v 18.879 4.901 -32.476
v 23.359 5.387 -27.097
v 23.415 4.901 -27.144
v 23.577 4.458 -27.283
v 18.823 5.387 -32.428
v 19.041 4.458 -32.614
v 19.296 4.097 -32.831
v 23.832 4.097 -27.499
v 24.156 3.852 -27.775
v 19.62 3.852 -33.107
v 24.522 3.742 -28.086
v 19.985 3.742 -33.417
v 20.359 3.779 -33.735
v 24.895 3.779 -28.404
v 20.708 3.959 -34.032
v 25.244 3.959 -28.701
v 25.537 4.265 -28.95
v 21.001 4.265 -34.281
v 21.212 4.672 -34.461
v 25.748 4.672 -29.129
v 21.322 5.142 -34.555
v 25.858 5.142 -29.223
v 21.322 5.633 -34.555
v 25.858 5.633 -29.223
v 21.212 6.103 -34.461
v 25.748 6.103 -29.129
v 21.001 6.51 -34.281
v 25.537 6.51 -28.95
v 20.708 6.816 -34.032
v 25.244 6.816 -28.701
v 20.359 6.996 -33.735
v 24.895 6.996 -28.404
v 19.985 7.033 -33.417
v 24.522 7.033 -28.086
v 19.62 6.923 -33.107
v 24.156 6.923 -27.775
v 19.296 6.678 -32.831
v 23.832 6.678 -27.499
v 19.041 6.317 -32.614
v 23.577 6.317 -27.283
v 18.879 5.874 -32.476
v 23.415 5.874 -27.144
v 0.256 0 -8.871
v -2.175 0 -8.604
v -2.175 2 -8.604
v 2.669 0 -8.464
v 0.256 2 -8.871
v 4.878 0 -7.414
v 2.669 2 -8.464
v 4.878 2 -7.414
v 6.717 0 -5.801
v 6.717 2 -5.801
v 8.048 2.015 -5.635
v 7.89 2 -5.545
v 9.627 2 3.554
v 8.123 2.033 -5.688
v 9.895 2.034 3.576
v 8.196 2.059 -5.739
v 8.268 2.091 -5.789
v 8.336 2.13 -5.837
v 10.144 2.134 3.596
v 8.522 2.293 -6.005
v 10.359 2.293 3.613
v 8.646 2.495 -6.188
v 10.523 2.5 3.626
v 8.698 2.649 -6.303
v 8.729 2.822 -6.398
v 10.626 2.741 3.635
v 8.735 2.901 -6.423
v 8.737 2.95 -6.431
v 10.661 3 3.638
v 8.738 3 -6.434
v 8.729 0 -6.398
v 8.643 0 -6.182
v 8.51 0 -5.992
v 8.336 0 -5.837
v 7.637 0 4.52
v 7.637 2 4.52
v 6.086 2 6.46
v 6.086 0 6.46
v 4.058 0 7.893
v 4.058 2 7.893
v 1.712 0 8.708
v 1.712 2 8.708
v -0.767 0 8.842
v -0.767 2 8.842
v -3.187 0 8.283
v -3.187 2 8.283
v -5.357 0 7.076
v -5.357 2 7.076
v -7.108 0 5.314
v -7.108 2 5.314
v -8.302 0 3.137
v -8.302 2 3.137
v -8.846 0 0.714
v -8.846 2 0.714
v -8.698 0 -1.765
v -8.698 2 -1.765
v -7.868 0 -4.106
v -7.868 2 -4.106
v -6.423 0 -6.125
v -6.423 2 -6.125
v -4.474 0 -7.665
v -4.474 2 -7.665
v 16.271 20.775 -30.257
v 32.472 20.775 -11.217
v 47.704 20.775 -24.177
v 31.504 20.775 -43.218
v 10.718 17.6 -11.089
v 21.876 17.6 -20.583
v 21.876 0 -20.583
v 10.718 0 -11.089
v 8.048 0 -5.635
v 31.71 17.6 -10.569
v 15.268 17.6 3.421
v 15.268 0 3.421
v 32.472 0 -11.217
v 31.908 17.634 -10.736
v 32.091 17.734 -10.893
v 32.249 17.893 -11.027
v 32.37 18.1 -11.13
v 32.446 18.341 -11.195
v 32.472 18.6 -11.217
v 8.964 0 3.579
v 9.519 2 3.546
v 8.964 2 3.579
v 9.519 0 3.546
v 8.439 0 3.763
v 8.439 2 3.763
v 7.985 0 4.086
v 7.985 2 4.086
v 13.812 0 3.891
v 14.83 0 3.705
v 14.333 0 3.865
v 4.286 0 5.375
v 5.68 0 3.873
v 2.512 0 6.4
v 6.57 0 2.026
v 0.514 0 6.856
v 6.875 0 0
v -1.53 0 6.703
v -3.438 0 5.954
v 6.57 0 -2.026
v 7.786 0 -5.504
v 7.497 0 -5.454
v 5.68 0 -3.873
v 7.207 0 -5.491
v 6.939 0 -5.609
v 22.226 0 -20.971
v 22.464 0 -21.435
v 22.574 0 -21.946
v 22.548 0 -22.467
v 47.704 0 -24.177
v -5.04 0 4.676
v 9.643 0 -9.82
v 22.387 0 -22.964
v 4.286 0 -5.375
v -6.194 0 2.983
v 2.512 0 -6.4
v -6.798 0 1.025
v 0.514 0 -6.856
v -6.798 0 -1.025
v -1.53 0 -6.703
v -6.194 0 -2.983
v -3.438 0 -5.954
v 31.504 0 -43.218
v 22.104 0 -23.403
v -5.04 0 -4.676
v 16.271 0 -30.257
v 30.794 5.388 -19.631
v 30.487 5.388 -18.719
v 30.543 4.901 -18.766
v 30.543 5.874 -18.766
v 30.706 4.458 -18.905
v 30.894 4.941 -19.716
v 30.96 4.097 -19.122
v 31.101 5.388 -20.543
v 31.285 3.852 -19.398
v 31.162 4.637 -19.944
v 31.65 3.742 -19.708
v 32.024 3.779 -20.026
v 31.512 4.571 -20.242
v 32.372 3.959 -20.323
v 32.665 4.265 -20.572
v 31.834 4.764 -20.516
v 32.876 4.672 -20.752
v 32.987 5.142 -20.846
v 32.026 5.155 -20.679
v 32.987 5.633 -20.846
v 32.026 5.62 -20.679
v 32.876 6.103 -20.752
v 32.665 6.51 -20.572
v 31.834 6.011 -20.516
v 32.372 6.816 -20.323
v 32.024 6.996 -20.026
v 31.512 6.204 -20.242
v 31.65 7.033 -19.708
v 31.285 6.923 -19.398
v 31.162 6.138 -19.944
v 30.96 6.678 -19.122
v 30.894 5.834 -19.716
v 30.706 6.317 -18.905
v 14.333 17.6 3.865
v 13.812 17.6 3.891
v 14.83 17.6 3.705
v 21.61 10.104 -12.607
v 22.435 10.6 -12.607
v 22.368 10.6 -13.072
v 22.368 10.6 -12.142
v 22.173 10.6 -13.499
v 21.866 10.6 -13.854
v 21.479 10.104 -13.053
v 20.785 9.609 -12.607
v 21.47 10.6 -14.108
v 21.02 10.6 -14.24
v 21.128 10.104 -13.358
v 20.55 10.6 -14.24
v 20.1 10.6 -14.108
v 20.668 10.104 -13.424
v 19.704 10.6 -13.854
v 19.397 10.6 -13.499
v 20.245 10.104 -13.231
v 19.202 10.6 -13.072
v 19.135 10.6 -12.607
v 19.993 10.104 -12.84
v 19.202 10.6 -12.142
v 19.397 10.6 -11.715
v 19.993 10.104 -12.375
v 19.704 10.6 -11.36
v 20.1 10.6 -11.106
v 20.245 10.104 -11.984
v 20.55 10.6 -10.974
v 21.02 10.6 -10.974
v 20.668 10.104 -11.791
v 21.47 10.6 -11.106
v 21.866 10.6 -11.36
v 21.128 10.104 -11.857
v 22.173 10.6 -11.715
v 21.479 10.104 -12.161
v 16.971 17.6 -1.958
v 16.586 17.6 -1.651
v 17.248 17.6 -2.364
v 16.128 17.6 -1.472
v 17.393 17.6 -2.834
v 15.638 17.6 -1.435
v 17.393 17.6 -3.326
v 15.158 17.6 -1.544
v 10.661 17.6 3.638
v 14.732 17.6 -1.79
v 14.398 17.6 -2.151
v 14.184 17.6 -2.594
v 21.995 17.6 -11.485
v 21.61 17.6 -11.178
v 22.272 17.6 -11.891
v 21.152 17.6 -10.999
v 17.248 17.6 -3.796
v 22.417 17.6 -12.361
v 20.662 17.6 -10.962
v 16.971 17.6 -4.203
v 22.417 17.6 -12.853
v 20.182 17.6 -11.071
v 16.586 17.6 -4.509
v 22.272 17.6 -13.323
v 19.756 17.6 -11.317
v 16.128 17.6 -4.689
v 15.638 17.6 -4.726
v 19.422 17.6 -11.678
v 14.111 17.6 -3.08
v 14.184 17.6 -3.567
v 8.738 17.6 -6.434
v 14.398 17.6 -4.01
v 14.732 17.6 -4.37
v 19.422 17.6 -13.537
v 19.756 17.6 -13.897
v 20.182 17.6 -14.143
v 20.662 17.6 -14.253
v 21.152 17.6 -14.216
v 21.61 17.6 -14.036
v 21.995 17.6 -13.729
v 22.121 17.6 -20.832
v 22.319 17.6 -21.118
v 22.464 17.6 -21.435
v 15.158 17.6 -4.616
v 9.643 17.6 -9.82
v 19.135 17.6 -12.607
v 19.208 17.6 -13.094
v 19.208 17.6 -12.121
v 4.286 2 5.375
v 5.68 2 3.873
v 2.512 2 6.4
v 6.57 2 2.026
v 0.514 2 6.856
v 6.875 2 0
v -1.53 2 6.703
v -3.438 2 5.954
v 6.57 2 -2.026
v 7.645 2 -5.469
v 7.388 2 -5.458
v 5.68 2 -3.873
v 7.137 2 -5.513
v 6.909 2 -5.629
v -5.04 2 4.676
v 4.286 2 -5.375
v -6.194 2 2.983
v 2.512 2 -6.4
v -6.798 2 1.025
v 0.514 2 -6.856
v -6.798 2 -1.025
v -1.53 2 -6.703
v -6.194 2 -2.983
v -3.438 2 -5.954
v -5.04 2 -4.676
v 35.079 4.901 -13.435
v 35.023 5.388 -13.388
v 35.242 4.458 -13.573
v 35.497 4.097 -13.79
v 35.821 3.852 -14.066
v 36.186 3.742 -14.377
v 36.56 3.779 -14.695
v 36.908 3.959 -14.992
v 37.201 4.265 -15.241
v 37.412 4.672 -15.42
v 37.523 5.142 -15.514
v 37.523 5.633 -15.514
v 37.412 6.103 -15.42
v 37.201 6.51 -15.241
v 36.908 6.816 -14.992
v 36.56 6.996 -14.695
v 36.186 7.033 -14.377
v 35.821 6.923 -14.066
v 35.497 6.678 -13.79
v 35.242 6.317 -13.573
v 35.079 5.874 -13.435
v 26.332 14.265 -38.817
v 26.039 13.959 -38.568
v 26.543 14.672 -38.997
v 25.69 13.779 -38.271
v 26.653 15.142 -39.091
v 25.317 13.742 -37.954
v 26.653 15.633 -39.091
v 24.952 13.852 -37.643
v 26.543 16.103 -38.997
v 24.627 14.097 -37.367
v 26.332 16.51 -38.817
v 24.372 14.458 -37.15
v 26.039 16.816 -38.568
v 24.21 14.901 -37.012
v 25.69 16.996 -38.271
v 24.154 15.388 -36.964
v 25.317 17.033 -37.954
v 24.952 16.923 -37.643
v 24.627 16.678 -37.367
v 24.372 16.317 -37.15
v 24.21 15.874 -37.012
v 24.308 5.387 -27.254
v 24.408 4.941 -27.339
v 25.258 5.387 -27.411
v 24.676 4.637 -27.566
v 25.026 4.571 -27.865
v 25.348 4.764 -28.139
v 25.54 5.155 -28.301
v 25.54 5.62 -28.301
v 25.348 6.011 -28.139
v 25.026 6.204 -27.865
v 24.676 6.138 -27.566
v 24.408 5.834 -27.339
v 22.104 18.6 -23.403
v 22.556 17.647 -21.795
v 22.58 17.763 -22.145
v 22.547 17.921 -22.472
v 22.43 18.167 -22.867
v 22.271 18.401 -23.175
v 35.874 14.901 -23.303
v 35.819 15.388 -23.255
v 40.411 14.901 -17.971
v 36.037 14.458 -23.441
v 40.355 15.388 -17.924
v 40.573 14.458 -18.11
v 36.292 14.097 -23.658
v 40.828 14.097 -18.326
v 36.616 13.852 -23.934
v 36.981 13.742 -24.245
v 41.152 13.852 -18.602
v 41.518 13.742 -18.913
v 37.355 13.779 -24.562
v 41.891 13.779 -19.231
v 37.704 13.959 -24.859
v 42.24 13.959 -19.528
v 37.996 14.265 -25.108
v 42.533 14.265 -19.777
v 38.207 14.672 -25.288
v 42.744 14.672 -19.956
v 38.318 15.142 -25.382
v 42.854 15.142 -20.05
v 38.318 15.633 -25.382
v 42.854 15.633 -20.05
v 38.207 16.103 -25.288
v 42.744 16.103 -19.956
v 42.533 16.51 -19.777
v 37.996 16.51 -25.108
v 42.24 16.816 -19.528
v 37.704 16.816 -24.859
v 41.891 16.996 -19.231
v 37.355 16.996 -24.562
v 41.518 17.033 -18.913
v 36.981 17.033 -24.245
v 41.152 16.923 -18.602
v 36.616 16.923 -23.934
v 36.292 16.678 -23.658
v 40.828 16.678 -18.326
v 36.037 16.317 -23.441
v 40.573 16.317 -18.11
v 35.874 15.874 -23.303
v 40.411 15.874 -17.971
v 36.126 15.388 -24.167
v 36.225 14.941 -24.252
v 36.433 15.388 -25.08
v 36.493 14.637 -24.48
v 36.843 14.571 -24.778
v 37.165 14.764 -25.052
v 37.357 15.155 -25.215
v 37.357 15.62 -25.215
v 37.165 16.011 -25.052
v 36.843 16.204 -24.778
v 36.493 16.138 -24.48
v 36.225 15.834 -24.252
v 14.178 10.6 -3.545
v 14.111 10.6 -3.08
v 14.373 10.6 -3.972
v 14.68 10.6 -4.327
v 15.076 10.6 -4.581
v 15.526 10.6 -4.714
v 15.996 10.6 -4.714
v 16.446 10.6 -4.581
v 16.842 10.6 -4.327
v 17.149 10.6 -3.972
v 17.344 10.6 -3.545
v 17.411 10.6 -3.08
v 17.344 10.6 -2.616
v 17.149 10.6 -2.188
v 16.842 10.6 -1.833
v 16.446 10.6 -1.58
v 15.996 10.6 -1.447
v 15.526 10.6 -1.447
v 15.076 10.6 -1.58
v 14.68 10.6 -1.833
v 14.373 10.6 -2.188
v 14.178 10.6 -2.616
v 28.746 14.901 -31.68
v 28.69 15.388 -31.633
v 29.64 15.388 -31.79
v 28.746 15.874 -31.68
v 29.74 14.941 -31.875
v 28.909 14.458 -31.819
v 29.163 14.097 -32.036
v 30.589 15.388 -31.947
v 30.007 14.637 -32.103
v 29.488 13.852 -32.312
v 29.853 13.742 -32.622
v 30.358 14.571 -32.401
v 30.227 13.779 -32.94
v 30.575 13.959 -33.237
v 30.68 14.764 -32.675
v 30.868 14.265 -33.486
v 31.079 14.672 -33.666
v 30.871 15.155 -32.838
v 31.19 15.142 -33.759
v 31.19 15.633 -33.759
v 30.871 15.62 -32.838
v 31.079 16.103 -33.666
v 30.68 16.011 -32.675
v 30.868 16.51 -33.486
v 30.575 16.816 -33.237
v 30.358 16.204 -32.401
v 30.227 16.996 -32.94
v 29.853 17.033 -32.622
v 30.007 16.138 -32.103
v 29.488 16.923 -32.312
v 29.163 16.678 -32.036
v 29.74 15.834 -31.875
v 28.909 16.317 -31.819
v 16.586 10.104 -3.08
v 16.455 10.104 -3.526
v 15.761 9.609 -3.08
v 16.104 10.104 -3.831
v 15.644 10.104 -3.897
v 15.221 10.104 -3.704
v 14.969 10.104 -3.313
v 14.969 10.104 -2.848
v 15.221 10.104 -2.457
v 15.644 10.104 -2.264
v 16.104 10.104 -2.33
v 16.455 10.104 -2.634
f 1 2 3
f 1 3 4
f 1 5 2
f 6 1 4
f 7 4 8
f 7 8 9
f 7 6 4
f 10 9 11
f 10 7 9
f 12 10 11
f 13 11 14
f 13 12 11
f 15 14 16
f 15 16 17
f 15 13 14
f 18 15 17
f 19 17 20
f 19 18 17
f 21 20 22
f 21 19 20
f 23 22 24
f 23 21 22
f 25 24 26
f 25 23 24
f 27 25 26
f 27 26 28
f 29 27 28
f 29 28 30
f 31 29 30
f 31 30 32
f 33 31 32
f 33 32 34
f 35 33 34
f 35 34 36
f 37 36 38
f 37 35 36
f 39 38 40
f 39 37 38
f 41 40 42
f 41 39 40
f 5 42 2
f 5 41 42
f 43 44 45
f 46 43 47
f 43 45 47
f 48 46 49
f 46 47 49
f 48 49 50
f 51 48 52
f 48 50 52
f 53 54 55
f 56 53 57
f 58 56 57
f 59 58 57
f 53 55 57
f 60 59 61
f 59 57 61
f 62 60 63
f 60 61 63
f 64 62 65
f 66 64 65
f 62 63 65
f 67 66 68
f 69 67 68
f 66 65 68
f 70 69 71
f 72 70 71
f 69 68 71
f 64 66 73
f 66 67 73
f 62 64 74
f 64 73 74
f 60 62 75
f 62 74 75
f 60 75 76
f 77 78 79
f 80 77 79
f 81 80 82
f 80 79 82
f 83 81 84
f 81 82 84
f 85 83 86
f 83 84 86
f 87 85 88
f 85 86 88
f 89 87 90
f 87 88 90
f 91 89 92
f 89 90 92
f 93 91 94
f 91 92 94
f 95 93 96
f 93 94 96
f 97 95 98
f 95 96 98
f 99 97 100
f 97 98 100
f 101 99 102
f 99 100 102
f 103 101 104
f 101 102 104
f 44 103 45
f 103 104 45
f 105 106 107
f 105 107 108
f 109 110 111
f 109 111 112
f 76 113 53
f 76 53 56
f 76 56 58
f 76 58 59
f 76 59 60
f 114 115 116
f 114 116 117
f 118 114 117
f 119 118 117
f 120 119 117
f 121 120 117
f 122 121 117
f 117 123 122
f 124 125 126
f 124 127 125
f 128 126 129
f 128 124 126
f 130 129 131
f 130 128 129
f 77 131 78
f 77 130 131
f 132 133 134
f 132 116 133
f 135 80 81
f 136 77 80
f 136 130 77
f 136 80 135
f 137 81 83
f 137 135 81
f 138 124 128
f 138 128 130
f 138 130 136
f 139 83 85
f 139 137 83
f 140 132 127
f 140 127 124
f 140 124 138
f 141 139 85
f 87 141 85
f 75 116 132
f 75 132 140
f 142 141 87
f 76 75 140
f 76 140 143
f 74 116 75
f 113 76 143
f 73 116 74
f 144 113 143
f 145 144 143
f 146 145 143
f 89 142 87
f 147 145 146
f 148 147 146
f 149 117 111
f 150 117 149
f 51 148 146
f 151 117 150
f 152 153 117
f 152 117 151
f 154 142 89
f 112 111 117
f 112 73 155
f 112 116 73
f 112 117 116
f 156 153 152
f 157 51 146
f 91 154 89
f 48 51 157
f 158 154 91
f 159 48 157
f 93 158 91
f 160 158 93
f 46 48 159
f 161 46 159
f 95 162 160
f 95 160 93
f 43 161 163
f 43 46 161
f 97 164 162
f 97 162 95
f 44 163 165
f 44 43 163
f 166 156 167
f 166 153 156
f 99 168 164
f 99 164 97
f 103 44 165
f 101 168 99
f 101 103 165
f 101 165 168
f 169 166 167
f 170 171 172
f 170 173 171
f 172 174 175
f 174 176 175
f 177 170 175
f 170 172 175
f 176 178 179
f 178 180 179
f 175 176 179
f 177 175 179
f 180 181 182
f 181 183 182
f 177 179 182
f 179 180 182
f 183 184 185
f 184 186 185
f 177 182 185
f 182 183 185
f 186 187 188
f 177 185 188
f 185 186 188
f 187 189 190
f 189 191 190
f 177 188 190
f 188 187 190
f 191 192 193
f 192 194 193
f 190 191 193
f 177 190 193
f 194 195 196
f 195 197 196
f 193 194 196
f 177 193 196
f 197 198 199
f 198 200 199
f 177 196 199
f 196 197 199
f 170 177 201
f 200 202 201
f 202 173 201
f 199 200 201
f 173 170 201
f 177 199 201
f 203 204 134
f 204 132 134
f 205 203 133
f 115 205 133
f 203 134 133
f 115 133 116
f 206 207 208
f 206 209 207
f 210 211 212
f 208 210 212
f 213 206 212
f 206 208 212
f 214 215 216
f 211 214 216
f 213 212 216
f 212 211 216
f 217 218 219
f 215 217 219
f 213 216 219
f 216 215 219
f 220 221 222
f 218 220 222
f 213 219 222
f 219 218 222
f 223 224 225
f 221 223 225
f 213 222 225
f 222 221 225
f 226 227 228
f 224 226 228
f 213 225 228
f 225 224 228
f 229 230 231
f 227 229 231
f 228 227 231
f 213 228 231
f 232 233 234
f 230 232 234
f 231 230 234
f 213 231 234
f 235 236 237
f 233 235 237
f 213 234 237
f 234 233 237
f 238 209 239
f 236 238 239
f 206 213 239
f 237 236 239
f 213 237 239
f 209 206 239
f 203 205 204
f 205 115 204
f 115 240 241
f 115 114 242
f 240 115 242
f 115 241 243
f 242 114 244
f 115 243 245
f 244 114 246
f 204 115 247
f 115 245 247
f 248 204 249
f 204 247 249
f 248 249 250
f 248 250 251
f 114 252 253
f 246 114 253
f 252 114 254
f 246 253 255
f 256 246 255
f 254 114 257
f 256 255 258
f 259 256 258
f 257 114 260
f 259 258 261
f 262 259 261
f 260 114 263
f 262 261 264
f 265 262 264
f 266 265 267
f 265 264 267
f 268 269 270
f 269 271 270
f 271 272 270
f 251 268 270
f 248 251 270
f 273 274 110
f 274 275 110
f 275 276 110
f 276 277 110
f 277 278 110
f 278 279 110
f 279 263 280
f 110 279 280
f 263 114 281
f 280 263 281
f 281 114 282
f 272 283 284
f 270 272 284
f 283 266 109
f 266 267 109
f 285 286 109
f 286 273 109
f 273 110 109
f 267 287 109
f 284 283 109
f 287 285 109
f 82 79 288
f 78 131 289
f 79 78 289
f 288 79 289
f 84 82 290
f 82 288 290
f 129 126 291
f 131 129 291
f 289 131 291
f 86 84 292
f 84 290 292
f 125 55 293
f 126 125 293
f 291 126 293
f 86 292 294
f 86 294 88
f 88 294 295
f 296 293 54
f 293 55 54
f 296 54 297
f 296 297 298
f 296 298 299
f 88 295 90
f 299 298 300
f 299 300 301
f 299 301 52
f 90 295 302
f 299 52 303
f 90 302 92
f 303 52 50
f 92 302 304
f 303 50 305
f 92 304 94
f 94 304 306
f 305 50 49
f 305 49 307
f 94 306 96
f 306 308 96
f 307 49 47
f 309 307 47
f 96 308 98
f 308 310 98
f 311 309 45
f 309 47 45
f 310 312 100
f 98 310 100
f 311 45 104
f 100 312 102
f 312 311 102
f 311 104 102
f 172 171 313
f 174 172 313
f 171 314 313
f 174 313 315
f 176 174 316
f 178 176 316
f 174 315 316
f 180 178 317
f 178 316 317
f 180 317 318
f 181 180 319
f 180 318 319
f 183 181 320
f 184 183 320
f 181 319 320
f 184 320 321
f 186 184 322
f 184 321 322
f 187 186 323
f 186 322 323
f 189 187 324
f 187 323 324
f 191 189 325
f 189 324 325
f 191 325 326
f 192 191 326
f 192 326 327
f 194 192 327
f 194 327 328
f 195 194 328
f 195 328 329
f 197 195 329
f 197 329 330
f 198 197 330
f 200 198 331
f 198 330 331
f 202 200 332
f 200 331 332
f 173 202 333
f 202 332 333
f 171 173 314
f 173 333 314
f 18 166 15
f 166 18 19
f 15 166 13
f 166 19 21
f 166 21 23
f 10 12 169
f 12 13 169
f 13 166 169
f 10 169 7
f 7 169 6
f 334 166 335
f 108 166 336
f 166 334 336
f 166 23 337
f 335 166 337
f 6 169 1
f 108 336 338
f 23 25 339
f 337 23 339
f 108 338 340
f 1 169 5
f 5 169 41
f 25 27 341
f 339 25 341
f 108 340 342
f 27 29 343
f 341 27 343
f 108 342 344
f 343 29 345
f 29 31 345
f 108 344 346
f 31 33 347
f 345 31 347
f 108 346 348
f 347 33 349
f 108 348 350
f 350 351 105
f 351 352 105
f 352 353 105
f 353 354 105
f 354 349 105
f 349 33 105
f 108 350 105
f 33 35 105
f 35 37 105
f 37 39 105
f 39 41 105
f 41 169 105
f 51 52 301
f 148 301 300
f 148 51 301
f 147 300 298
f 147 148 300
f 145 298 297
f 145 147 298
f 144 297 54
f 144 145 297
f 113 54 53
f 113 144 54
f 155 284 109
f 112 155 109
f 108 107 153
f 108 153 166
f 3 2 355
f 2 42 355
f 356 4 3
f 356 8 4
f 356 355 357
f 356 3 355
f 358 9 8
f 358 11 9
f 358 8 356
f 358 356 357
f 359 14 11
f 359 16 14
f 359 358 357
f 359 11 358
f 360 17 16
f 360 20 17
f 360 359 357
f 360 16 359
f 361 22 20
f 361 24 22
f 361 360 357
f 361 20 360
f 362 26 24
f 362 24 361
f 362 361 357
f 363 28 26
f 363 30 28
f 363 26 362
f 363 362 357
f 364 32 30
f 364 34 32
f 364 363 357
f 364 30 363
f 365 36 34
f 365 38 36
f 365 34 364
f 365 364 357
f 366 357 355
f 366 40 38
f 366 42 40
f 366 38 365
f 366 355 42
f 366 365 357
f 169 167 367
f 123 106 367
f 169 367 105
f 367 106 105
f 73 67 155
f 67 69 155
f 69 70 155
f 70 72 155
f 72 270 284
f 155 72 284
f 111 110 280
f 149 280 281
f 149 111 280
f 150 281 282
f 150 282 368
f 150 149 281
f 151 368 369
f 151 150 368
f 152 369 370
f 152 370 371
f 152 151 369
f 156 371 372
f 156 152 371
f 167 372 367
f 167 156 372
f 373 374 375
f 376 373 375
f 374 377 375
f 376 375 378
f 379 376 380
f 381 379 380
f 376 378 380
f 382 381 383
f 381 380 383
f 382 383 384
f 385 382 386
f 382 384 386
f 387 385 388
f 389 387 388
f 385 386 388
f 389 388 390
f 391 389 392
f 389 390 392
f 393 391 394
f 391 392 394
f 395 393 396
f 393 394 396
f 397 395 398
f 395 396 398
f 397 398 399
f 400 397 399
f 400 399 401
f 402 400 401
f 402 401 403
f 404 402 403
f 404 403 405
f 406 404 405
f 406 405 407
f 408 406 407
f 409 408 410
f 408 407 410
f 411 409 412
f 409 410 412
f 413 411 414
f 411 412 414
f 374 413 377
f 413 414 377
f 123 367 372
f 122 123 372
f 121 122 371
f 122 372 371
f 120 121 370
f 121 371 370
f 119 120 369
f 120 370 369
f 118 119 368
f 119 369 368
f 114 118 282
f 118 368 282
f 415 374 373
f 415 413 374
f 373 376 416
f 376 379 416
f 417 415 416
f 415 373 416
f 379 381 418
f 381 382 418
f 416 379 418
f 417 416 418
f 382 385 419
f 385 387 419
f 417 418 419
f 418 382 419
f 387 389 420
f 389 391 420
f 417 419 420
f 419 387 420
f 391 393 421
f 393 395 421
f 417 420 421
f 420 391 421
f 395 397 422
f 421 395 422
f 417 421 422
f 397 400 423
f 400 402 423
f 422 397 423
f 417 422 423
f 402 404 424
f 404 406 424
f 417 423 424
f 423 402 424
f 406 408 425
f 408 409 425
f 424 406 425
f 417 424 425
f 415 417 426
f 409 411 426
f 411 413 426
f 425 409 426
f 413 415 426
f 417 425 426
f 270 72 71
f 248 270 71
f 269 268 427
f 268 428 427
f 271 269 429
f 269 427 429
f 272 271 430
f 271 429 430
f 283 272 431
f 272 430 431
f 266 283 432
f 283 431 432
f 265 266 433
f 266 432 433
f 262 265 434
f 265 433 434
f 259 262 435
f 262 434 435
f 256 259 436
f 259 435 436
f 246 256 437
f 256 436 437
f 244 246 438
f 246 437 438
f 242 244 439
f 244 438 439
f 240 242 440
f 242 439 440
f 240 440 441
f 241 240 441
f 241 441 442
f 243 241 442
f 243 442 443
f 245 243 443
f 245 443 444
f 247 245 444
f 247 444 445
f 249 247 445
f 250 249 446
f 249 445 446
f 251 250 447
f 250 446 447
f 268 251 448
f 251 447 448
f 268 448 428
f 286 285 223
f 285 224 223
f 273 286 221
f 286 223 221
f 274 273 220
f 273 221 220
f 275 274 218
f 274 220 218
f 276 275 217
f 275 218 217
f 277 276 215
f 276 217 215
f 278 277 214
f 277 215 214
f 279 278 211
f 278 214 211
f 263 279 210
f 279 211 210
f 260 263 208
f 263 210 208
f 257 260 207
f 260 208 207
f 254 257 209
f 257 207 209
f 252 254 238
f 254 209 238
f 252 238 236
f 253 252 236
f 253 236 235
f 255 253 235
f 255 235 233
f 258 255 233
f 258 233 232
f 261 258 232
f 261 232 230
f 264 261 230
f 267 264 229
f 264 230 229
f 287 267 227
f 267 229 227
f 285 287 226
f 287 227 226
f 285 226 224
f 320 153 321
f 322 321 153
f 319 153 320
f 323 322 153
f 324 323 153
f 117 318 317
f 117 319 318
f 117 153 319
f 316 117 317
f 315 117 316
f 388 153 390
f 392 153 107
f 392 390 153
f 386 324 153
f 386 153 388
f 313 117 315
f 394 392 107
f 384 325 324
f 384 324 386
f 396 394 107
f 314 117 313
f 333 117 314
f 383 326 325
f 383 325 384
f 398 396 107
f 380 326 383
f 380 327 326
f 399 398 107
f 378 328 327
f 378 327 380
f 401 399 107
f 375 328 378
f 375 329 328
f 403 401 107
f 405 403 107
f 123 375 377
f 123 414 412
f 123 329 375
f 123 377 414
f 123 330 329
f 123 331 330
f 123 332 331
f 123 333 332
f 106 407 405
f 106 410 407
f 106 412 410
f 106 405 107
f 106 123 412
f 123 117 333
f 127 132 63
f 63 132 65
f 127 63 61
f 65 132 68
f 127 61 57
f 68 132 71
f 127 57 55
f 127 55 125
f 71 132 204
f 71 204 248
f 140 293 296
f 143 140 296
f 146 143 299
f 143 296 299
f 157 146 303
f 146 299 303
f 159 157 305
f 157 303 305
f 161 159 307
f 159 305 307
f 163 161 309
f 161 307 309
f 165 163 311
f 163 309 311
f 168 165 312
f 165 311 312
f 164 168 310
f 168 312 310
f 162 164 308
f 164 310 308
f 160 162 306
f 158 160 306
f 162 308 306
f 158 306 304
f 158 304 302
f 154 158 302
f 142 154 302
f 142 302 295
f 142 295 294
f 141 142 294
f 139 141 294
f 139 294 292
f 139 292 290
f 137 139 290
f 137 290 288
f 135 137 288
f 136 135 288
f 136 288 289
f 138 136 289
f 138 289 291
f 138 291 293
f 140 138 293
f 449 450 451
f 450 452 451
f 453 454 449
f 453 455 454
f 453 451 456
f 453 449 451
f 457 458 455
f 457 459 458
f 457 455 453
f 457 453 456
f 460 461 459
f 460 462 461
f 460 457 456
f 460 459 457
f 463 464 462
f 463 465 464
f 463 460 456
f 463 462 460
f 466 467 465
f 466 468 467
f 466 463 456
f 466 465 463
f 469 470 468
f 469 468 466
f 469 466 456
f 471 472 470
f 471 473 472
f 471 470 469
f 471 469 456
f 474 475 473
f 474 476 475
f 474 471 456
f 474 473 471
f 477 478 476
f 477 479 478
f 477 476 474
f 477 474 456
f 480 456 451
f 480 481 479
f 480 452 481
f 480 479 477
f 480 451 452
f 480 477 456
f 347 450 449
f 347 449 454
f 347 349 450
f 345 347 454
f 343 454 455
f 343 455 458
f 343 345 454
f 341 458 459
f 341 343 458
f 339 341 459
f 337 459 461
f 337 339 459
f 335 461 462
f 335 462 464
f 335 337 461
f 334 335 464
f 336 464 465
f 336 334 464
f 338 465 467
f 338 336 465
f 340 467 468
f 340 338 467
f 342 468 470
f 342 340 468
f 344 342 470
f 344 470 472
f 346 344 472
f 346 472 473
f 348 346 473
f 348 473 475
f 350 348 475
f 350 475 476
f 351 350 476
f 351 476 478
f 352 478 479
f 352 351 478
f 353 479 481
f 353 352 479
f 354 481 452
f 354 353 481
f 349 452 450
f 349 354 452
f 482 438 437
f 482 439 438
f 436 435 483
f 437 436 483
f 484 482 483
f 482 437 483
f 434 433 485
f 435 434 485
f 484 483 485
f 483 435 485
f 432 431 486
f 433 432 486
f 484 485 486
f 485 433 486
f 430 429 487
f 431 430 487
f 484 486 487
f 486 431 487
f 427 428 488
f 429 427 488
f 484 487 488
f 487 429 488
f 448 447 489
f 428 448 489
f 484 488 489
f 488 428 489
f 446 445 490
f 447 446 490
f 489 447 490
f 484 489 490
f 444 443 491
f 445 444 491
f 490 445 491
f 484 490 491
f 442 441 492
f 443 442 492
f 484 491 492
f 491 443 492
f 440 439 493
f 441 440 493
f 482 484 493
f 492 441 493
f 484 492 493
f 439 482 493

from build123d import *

# Parameters (mm, degrees)
SKETCH1_R                      = 12.5
BOSS_EXTRUDE1_DEPTH            = 17.6
SKETCH2_R                      = 6.875
CUT_EXTRUDE1_DEPTH             = 50.8
SKETCH3_R                      = 8.875
CUT_EXTRUDE3_DEPTH             = 15.6
CUT_EXTRUDE4_DEPTH             = 18.6
BOSS_EXTRUDE2_DEPTH            = 17.6
FILLET1_R                      = 4
SKETCH6_W                      = 25
SKETCH6_H                      = 20.775
BOSS_EXTRUDE3_DEPTH            = 20
M4X0_7_TAPPED_HOLE2_AT_2_COUNT = 2
M4X0_7_TAPPED_HOLE2_AT_2_PITCH = 12.206555616
M4X0_7_TAPPED_HOLE1_D          = 3.3
M4X0_7_TAPPED_HOLE1_DEPTH      = 7
M4X0_7_TAPPED_HOLE1_TIP        = 0.991420021
FILLET4_R                      = 1
FILLET6_R                      = 1
FILLET7_R                      = 2
CUT_EXTRUDE6_DEPTH             = 15.6
FILLET8_R                      = 5
BOSS_EXTRUDE4_DEPTH            = 17.6
CUT_EXTRUDE8_DEPTH             = 18.6000001
CUT_EXTRUDE9_DEPTH             = 18.6000001
CUT_EXTRUDE10_DEPTH            = 15.6
FILLET10_R                     = 1
FILLET12_R                     = 1
FILLET13_R                     = 2


with BuildPart() as part:
    # Sketch1 → Boss-Extrude1 (new body)
    with BuildSketch(Plane(origin=(0, 0, 0), x_dir=(1, 0, 0), z_dir=(0, 1, 0))):
        Circle(SKETCH1_R)
    extrude(amount=BOSS_EXTRUDE1_DEPTH)

    # Sketch2 → Cut-Extrude1 (cut)
    with BuildSketch(Plane(origin=(0, 17.6, 0), x_dir=(1, 0, 0), z_dir=(0, 1, 0))):
        Circle(SKETCH2_R)
    extrude(amount=-CUT_EXTRUDE1_DEPTH, mode=Mode.SUBTRACT)

    # Sketch3 → Cut-Extrude3 (cut)
    with BuildSketch(Plane(origin=(0, 17.6, 0), x_dir=(1, 0, 0), z_dir=(0, 1, 0))):
        Circle(SKETCH3_R)
    extrude(amount=-CUT_EXTRUDE3_DEPTH, mode=Mode.SUBTRACT)

    # Sketch4 → Cut-Extrude4 (cut, through all)
    with BuildSketch(Plane(origin=(0, 17.6, 0), x_dir=(1, 0, 0), z_dir=(0, 1, 0))):
        with BuildLine():
            ThreePointArc((-3.035428772, 8.339772009), (2.668763971, 8.464237938), (7.269974393, 5.090490873))
            Line((7.269974393, 5.090490873), (10.239400554, 7.169705454))
            ThreePointArc((10.239400554, 7.169705454), (3.758822494, 11.921461884), (-4.275251792, 11.74615776))
            Line((-4.275251792, 11.74615776), (-3.035428772, 8.339772009))
        make_face()
    extrude(amount=-CUT_EXTRUDE4_DEPTH, mode=Mode.SUBTRACT)

    # Sketch5 → Boss-Extrude2 (add, through all)
    with BuildSketch(Plane(origin=(0, 17.6, 0), x_dir=(1, 0, 0), z_dir=(0, 1, 0))):
        with BuildLine():
            Line((8.100371818, -9.520187835), (32.472052675, 11.216764019))
            Line((32.472052675, 11.216764019), (23.399636239, 21.879374394))
            Line((23.399636239, 21.879374394), (10.717665156, 11.088759446))
            Line((10.717665156, 11.088759446), (10.239400554, 7.169705454))
            ThreePointArc((10.239400554, 7.169705454), (12.398586499, -1.589041484), (8.100371818, -9.520187835))
        make_face()
    extrude(amount=-BOSS_EXTRUDE2_DEPTH)

    # Fillet1
    fillet1_edges = [part.edges().sort_by_distance(p)[0] for p in [
        (-3.035428772, 9.8, -8.339772009),
    ]]
    fillet(fillet1_edges, radius=FILLET1_R)

    # Sketch6 → Boss-Extrude3 (add)
    with BuildSketch(Plane(origin=(24.371680857, 0, -20.736951854), x_dir=(-0.648029745, 0, -0.761615027), z_dir=(0.761615027, 0, -0.648029745))):
        with Locations((0, 10.3875)):
            Rectangle(SKETCH6_W, SKETCH6_H)
    extrude(amount=BOSS_EXTRUDE3_DEPTH)

    # Sketch9 → M4x0.7 Tapped Hole2 (revolve, cut)
    with BuildSketch(Plane(origin=(25.410689361, 15.3875, -38.033496634), x_dir=(-0.761615027, 0, 0.648029745), z_dir=(0, 1, 0))):
        Polygon((0, 0), (0, 7.991420021), (1.65, 7), (1.65, 0), align=None)
    m4x0_7_tapped_hole2 = revolve(axis=Axis((21.295700477, 15.3875, -42.869752054), (0.648029745, 0, 0.761615027)), mode=Mode.SUBTRACT)

    # M4x0.7 Tapped Hole2 at 2: M4x0.7 Tapped Hole2 ×2
    with Locations(*[Vector(-0.436757539, -0.819231921, 0.371620657) * (i * M4X0_7_TAPPED_HOLE2_AT_2_PITCH) for i in range(1, M4X0_7_TAPPED_HOLE2_AT_2_COUNT)]):
        add(m4x0_7_tapped_hole2, mode=Mode.SUBTRACT)

    # Mirror1: M4x0.7 Tapped Hole2 across plane
    add(m4x0_7_tapped_hole2.mirror(Plane(origin=(0, 0, 0), x_dir=(-0.761615027, 0, 0.648029745), z_dir=(-0.648029745, 0, -0.761615027))), mode=Mode.SUBTRACT)

    # Mirror1 copy 1 sketch → Mirror1 copy 1 (revolve, cut)
    with BuildSketch(Plane(origin=(36.280127809, 5.3875, -14.456912746), x_dir=(-0.761615027, 0, 0.648029745), z_dir=(0, 1, 0))):
        Polygon((0, 0), (0, -7.991420021), (1.65, -7), (1.65, 0), align=None)
    revolve(axis=Axis((40.395116693, 5.3875, -9.620657326), (0.648029745, 0, 0.761615027)), mode=Mode.SUBTRACT)

    # M4x0.7 Tapped Hole1
    with Locations(Plane(origin=(0, 17.6, 0), x_dir=(1, 0, 0), z_dir=(0, 1, 0))):
        with Locations((20.785019884, 12.607162838), (15.760988598, 3.080405276)):
            Hole(M4X0_7_TAPPED_HOLE1_D / 2, depth=M4X0_7_TAPPED_HOLE1_DEPTH)
            with Locations((0, 0, -(M4X0_7_TAPPED_HOLE1_DEPTH + M4X0_7_TAPPED_HOLE1_TIP / 2))):  # 118° drill point
                Cone(0, M4X0_7_TAPPED_HOLE1_D / 2, M4X0_7_TAPPED_HOLE1_TIP, mode=Mode.SUBTRACT)

    # Fillet4
    fillet4_edges = [part.edges().sort_by_distance(p)[0] for p in [
        (27.935844457, 17.6, -16.548069207),
    ]]
    fillet(fillet4_edges, radius=FILLET4_R)

    # Fillet6
    fillet6_edges = [part.edges().sort_by_distance(p)[0] for p in [
        (-3.035428772, 1, -8.339772009),
        (7.269974393, 1, -5.090490873),
    ]]
    fillet(fillet6_edges, radius=FILLET6_R)

    # Fillet7
    fillet7_edges = [part.edges().sort_by_distance(p)[0] for p in [
        (23.399636239, 8.8, -21.879374394),
    ]]
    fillet(fillet7_edges, radius=FILLET7_R)

    # Sketch13 → Cut-Extrude6 (cut)
    with BuildSketch(Plane(origin=(0, 17.6, 0), x_dir=(1, 0, 0), z_dir=(0, 1, 0))):
        Polygon((8.029469851, 3.780640013), (11.336580589, 16.160351586), (5.704740036, 6.798644433), (7.043250731, 5.399837418), align=None)
    extrude(amount=-CUT_EXTRUDE6_DEPTH, mode=Mode.SUBTRACT)

    # Fillet8
    fillet8_edges = [part.edges().sort_by_distance(p)[0] for p in [
        (8.029469851, 9.8, -3.780640013),
    ]]
    fillet(fillet8_edges, radius=FILLET8_R)

    # Sketch14 → Boss-Extrude4 (add)
    with BuildSketch(Plane(origin=(0, 17.6, 0), x_dir=(1, 0, 0), z_dir=(0, 1, 0))):
        Polygon((8.634649617, 6.046046752), (9.642801422, 9.819923576), (10.717665156, 11.088759446), (10.239400554, 7.169705454), align=None)
    extrude(amount=-BOSS_EXTRUDE4_DEPTH)

    # Sketch15 → Cut-Extrude8 (cut, through all)
    with BuildSketch(Plane(origin=(0, 17.6, 0), x_dir=(1, 0, 0), z_dir=(0, 1, 0))):
        with BuildLine():
            Line((8.100371818, -9.520187835), (11.149703632, -6.925625425))
            Line((11.149703632, -6.925625425), (8.182097481, -3.437863553))
            ThreePointArc((8.182097481, -3.437863553), (-6.728578701, -5.787214672), (-2.175290984, 8.6042858))
            Line((-2.175290984, 8.6042858), (-4.275251792, 11.74615776))
            ThreePointArc((-4.275251792, 11.74615776), (-10.803807178, -6.287109865), (8.100371818, -9.520187835))
        make_face()
    extrude(amount=-CUT_EXTRUDE8_DEPTH, mode=Mode.SUBTRACT)

    # Sketch16 → Cut-Extrude9 (cut, through all)
    with BuildSketch(Plane(origin=(0, 17.6, 0), x_dir=(1, 0, 0), z_dir=(0, 1, 0))):
        Polygon((8.182097481, -3.437863553), (11.149703632, -6.925625425), (14.637465505, -3.958019274), align=None)
    extrude(amount=-CUT_EXTRUDE9_DEPTH, mode=Mode.SUBTRACT)

    # Sketch17 → Cut-Extrude10 (cut)
    with BuildSketch(Plane(origin=(0, 17.6, 0), x_dir=(1, 0, 0), z_dir=(0, 1, 0))):
        Polygon((8.738215958, 6.433733022), (10.661432187, -3.637641494), (8.182097481, -3.437863553), (7.951366346, 5.910414581), align=None)
    extrude(amount=-CUT_EXTRUDE10_DEPTH, mode=Mode.SUBTRACT)

    # Fillet10
    fillet10_edges = [part.edges().sort_by_distance(p)[0] for p in [
        (8.634649617, 1, -6.046046752),
    ]]
    fillet(fillet10_edges, radius=FILLET10_R)

    # Fillet12
    fillet12_edges = [part.edges().sort_by_distance(p)[0] for p in [
        (9.699824072, 2, -1.398045764),
    ]]
    fillet(fillet12_edges, radius=FILLET12_R)

    # Fillet13
    fillet13_edges = [part.edges().sort_by_distance(p)[0] for p in [
        (8.182097481, 1, 3.437863553),
        (14.637465505, 8.8, 3.958019274),
    ]]
    fillet(fillet13_edges, radius=FILLET13_R)


solid = part.part
